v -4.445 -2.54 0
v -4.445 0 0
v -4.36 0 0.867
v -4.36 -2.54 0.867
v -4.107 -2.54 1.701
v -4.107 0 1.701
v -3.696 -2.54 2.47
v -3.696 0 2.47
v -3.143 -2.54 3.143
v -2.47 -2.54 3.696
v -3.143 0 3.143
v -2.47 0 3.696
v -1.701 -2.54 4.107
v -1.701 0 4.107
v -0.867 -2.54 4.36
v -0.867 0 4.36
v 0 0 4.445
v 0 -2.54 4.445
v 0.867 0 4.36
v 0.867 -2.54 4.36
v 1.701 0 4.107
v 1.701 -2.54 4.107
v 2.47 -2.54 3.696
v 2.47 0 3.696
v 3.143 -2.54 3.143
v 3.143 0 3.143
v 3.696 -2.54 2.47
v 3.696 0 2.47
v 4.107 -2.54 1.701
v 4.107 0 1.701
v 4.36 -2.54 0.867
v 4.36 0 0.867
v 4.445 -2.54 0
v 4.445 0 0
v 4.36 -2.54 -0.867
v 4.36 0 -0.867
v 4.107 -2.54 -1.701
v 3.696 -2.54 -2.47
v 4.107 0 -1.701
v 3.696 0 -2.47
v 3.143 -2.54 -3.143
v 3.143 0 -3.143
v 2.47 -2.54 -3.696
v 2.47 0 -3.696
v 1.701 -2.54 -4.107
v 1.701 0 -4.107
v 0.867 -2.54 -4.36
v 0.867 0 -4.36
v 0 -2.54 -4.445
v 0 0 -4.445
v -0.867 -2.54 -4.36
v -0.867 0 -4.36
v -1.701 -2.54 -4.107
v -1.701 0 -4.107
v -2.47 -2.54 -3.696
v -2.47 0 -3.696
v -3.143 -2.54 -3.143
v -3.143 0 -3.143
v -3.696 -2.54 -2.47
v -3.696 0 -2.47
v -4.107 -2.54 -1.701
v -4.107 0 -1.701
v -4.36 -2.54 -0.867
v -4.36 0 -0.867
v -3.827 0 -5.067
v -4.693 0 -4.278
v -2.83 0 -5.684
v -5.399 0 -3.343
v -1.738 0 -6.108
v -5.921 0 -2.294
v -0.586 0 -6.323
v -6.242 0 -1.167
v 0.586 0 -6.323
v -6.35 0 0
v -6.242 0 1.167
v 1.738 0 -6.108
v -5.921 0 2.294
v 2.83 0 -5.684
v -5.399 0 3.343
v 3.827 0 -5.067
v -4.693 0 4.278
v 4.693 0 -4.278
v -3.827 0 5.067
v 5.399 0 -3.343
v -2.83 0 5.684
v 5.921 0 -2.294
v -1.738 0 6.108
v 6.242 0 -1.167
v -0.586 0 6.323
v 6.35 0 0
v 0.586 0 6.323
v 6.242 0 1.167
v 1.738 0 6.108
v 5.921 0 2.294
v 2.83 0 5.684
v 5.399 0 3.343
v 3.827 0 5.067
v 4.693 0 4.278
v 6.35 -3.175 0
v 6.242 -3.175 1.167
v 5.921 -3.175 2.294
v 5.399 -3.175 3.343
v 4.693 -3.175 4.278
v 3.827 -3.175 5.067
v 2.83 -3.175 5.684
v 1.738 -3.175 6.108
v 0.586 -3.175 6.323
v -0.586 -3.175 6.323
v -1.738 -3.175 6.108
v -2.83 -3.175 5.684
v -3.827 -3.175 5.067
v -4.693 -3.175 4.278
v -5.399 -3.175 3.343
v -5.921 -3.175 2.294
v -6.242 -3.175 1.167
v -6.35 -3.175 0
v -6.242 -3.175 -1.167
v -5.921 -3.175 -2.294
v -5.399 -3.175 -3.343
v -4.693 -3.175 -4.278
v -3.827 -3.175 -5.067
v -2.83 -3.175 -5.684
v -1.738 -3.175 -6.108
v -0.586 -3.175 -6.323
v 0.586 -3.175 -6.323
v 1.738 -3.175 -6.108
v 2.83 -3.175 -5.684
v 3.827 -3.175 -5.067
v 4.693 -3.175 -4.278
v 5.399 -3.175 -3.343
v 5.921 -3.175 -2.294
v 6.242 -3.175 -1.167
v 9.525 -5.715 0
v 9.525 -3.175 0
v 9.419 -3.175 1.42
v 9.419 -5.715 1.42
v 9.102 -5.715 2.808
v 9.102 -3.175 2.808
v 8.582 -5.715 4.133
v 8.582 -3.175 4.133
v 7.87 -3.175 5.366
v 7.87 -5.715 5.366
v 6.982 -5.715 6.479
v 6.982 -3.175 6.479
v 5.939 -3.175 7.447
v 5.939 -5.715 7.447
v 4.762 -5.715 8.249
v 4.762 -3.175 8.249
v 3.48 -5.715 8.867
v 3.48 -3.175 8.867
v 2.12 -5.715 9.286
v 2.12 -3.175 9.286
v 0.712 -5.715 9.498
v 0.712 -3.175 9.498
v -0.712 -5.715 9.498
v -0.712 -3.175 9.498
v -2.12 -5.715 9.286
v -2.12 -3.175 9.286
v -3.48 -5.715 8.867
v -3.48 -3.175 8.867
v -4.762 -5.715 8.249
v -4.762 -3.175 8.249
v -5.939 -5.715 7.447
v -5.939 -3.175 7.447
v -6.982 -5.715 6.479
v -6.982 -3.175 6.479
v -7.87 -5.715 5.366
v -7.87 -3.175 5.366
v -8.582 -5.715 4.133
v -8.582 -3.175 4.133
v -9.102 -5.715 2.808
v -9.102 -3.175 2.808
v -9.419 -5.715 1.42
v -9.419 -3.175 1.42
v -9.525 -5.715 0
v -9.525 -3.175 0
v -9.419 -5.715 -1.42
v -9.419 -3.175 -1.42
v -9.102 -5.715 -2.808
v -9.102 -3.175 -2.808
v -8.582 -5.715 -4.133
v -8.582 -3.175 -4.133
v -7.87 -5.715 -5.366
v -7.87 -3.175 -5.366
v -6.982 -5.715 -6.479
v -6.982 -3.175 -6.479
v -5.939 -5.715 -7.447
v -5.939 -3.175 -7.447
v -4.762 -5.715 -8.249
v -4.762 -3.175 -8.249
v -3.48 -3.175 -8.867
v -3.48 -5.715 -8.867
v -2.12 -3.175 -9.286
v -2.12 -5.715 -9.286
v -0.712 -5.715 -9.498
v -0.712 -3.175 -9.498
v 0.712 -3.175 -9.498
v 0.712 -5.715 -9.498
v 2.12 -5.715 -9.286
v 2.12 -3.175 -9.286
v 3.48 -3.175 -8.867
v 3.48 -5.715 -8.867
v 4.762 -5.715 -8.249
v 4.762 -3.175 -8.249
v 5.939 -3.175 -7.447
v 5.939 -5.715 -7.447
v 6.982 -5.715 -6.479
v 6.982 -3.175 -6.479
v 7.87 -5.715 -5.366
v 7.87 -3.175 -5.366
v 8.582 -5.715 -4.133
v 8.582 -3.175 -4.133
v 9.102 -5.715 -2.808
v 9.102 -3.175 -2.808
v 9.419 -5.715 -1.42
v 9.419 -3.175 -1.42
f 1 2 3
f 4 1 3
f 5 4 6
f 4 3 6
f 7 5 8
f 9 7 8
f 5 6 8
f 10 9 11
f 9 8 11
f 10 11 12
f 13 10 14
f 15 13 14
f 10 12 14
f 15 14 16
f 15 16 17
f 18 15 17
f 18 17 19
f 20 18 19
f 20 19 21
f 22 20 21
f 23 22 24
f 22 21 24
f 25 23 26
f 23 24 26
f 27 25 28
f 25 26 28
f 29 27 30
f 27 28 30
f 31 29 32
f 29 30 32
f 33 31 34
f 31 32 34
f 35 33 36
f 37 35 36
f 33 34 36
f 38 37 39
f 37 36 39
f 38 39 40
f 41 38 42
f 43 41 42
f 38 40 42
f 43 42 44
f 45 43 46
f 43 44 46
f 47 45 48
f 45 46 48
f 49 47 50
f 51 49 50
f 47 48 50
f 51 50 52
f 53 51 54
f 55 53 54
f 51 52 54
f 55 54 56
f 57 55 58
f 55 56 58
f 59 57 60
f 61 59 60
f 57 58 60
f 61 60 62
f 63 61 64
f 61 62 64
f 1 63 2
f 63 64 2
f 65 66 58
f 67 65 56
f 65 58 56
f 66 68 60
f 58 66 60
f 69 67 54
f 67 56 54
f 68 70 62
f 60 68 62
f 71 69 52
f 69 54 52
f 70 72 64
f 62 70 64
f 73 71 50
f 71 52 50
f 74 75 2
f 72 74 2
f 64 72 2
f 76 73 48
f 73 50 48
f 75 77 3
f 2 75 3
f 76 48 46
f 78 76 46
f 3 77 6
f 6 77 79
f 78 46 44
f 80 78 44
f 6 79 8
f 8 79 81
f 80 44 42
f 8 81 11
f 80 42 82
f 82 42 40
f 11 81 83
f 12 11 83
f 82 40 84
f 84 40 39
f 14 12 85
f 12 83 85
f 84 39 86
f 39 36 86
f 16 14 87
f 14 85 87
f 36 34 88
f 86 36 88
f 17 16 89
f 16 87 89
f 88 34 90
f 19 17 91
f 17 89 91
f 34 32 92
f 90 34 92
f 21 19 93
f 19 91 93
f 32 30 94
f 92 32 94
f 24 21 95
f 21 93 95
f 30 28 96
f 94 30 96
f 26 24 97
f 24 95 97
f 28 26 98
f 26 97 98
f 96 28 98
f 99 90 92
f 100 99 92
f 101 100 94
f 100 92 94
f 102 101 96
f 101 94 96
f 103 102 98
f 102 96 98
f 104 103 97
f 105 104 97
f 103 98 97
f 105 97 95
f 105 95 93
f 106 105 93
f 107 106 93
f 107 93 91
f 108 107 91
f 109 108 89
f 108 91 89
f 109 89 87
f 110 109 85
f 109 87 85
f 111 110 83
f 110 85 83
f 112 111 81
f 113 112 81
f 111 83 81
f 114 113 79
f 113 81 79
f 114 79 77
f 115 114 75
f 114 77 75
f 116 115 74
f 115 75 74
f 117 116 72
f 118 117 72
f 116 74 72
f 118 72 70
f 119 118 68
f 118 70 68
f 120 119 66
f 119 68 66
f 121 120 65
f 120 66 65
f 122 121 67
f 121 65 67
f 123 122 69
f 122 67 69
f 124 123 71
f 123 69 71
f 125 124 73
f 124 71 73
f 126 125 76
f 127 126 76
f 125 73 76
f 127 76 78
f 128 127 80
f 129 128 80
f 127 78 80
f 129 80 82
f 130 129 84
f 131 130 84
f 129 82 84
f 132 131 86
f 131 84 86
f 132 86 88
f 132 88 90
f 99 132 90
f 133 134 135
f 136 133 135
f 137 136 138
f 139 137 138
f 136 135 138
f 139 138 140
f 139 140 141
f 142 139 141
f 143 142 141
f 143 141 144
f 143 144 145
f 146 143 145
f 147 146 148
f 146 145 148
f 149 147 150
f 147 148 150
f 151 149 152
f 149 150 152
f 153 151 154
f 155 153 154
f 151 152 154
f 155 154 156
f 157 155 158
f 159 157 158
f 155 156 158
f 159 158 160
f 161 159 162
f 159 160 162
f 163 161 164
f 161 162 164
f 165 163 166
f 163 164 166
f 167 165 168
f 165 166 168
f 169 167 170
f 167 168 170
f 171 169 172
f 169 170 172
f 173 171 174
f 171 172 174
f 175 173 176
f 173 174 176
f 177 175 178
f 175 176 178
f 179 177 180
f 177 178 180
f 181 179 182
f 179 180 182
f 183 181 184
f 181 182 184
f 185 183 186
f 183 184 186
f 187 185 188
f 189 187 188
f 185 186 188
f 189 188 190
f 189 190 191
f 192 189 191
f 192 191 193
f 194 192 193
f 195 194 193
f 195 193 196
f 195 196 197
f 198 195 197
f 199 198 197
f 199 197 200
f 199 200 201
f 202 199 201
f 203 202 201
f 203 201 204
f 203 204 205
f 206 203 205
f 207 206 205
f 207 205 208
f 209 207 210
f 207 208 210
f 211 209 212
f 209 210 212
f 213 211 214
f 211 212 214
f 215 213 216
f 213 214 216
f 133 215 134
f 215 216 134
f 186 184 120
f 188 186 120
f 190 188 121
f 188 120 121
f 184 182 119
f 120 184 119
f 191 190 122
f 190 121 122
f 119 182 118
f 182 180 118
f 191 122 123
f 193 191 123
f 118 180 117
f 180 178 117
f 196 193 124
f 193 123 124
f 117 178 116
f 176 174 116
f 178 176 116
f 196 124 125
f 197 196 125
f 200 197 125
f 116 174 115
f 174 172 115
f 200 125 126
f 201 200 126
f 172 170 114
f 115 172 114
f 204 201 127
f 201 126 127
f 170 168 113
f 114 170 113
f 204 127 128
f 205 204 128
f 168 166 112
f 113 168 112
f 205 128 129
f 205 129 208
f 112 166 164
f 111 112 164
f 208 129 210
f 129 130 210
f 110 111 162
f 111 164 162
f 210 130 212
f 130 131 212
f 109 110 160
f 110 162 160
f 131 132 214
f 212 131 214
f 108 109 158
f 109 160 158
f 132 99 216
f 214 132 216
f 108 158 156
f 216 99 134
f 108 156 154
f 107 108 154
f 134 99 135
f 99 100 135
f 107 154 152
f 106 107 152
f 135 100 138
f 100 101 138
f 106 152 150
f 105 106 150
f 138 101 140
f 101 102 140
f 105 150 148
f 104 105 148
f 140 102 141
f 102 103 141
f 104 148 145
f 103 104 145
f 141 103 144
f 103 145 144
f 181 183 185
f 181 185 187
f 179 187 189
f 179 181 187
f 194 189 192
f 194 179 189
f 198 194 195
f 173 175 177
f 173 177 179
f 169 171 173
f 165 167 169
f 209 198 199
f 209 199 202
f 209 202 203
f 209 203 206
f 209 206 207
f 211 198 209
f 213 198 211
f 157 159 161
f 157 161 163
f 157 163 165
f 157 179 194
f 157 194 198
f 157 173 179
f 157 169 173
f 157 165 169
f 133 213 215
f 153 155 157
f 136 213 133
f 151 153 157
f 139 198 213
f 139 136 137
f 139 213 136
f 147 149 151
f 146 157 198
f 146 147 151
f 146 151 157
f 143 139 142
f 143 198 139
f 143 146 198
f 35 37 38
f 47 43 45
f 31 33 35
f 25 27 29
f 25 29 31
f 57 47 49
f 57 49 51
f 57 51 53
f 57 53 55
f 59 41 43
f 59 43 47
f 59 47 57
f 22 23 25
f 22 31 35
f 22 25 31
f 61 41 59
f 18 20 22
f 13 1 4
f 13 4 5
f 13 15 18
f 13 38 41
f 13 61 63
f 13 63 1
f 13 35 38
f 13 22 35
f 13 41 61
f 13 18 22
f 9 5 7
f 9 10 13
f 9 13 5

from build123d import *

# Parameters (mm, degrees)
F0_R     = 6.35
F1_DEPTH = 3.175
F2_R     = 9.525
F2_R_2   = 6.35
F3_DEPTH = 2.54
F4_R     = 4.445
F5_DEPTH = 2.54


with BuildPart() as f1:
    # F0 (on Front) → F1 (new body)
    with BuildSketch(Plane.XZ):
        Circle(F0_R)
    extrude(amount=F1_DEPTH)

    # F2 (on face) → F3 (join)
    with BuildSketch(Plane.XZ.offset(3.175)):
        Circle(F2_R)
        Circle(F2_R_2, mode=Mode.SUBTRACT)
        Circle(F2_R_2)
    extrude(amount=F3_DEPTH)

    # F4 (on face) → F5 (cut)
    with BuildSketch(Plane(origin=(0, 0, 0), x_dir=(-1, 0, 0), z_dir=(0, 1, 0))):
        Circle(F4_R)
    extrude(amount=-F5_DEPTH, mode=Mode.SUBTRACT)


solid = f1.part
